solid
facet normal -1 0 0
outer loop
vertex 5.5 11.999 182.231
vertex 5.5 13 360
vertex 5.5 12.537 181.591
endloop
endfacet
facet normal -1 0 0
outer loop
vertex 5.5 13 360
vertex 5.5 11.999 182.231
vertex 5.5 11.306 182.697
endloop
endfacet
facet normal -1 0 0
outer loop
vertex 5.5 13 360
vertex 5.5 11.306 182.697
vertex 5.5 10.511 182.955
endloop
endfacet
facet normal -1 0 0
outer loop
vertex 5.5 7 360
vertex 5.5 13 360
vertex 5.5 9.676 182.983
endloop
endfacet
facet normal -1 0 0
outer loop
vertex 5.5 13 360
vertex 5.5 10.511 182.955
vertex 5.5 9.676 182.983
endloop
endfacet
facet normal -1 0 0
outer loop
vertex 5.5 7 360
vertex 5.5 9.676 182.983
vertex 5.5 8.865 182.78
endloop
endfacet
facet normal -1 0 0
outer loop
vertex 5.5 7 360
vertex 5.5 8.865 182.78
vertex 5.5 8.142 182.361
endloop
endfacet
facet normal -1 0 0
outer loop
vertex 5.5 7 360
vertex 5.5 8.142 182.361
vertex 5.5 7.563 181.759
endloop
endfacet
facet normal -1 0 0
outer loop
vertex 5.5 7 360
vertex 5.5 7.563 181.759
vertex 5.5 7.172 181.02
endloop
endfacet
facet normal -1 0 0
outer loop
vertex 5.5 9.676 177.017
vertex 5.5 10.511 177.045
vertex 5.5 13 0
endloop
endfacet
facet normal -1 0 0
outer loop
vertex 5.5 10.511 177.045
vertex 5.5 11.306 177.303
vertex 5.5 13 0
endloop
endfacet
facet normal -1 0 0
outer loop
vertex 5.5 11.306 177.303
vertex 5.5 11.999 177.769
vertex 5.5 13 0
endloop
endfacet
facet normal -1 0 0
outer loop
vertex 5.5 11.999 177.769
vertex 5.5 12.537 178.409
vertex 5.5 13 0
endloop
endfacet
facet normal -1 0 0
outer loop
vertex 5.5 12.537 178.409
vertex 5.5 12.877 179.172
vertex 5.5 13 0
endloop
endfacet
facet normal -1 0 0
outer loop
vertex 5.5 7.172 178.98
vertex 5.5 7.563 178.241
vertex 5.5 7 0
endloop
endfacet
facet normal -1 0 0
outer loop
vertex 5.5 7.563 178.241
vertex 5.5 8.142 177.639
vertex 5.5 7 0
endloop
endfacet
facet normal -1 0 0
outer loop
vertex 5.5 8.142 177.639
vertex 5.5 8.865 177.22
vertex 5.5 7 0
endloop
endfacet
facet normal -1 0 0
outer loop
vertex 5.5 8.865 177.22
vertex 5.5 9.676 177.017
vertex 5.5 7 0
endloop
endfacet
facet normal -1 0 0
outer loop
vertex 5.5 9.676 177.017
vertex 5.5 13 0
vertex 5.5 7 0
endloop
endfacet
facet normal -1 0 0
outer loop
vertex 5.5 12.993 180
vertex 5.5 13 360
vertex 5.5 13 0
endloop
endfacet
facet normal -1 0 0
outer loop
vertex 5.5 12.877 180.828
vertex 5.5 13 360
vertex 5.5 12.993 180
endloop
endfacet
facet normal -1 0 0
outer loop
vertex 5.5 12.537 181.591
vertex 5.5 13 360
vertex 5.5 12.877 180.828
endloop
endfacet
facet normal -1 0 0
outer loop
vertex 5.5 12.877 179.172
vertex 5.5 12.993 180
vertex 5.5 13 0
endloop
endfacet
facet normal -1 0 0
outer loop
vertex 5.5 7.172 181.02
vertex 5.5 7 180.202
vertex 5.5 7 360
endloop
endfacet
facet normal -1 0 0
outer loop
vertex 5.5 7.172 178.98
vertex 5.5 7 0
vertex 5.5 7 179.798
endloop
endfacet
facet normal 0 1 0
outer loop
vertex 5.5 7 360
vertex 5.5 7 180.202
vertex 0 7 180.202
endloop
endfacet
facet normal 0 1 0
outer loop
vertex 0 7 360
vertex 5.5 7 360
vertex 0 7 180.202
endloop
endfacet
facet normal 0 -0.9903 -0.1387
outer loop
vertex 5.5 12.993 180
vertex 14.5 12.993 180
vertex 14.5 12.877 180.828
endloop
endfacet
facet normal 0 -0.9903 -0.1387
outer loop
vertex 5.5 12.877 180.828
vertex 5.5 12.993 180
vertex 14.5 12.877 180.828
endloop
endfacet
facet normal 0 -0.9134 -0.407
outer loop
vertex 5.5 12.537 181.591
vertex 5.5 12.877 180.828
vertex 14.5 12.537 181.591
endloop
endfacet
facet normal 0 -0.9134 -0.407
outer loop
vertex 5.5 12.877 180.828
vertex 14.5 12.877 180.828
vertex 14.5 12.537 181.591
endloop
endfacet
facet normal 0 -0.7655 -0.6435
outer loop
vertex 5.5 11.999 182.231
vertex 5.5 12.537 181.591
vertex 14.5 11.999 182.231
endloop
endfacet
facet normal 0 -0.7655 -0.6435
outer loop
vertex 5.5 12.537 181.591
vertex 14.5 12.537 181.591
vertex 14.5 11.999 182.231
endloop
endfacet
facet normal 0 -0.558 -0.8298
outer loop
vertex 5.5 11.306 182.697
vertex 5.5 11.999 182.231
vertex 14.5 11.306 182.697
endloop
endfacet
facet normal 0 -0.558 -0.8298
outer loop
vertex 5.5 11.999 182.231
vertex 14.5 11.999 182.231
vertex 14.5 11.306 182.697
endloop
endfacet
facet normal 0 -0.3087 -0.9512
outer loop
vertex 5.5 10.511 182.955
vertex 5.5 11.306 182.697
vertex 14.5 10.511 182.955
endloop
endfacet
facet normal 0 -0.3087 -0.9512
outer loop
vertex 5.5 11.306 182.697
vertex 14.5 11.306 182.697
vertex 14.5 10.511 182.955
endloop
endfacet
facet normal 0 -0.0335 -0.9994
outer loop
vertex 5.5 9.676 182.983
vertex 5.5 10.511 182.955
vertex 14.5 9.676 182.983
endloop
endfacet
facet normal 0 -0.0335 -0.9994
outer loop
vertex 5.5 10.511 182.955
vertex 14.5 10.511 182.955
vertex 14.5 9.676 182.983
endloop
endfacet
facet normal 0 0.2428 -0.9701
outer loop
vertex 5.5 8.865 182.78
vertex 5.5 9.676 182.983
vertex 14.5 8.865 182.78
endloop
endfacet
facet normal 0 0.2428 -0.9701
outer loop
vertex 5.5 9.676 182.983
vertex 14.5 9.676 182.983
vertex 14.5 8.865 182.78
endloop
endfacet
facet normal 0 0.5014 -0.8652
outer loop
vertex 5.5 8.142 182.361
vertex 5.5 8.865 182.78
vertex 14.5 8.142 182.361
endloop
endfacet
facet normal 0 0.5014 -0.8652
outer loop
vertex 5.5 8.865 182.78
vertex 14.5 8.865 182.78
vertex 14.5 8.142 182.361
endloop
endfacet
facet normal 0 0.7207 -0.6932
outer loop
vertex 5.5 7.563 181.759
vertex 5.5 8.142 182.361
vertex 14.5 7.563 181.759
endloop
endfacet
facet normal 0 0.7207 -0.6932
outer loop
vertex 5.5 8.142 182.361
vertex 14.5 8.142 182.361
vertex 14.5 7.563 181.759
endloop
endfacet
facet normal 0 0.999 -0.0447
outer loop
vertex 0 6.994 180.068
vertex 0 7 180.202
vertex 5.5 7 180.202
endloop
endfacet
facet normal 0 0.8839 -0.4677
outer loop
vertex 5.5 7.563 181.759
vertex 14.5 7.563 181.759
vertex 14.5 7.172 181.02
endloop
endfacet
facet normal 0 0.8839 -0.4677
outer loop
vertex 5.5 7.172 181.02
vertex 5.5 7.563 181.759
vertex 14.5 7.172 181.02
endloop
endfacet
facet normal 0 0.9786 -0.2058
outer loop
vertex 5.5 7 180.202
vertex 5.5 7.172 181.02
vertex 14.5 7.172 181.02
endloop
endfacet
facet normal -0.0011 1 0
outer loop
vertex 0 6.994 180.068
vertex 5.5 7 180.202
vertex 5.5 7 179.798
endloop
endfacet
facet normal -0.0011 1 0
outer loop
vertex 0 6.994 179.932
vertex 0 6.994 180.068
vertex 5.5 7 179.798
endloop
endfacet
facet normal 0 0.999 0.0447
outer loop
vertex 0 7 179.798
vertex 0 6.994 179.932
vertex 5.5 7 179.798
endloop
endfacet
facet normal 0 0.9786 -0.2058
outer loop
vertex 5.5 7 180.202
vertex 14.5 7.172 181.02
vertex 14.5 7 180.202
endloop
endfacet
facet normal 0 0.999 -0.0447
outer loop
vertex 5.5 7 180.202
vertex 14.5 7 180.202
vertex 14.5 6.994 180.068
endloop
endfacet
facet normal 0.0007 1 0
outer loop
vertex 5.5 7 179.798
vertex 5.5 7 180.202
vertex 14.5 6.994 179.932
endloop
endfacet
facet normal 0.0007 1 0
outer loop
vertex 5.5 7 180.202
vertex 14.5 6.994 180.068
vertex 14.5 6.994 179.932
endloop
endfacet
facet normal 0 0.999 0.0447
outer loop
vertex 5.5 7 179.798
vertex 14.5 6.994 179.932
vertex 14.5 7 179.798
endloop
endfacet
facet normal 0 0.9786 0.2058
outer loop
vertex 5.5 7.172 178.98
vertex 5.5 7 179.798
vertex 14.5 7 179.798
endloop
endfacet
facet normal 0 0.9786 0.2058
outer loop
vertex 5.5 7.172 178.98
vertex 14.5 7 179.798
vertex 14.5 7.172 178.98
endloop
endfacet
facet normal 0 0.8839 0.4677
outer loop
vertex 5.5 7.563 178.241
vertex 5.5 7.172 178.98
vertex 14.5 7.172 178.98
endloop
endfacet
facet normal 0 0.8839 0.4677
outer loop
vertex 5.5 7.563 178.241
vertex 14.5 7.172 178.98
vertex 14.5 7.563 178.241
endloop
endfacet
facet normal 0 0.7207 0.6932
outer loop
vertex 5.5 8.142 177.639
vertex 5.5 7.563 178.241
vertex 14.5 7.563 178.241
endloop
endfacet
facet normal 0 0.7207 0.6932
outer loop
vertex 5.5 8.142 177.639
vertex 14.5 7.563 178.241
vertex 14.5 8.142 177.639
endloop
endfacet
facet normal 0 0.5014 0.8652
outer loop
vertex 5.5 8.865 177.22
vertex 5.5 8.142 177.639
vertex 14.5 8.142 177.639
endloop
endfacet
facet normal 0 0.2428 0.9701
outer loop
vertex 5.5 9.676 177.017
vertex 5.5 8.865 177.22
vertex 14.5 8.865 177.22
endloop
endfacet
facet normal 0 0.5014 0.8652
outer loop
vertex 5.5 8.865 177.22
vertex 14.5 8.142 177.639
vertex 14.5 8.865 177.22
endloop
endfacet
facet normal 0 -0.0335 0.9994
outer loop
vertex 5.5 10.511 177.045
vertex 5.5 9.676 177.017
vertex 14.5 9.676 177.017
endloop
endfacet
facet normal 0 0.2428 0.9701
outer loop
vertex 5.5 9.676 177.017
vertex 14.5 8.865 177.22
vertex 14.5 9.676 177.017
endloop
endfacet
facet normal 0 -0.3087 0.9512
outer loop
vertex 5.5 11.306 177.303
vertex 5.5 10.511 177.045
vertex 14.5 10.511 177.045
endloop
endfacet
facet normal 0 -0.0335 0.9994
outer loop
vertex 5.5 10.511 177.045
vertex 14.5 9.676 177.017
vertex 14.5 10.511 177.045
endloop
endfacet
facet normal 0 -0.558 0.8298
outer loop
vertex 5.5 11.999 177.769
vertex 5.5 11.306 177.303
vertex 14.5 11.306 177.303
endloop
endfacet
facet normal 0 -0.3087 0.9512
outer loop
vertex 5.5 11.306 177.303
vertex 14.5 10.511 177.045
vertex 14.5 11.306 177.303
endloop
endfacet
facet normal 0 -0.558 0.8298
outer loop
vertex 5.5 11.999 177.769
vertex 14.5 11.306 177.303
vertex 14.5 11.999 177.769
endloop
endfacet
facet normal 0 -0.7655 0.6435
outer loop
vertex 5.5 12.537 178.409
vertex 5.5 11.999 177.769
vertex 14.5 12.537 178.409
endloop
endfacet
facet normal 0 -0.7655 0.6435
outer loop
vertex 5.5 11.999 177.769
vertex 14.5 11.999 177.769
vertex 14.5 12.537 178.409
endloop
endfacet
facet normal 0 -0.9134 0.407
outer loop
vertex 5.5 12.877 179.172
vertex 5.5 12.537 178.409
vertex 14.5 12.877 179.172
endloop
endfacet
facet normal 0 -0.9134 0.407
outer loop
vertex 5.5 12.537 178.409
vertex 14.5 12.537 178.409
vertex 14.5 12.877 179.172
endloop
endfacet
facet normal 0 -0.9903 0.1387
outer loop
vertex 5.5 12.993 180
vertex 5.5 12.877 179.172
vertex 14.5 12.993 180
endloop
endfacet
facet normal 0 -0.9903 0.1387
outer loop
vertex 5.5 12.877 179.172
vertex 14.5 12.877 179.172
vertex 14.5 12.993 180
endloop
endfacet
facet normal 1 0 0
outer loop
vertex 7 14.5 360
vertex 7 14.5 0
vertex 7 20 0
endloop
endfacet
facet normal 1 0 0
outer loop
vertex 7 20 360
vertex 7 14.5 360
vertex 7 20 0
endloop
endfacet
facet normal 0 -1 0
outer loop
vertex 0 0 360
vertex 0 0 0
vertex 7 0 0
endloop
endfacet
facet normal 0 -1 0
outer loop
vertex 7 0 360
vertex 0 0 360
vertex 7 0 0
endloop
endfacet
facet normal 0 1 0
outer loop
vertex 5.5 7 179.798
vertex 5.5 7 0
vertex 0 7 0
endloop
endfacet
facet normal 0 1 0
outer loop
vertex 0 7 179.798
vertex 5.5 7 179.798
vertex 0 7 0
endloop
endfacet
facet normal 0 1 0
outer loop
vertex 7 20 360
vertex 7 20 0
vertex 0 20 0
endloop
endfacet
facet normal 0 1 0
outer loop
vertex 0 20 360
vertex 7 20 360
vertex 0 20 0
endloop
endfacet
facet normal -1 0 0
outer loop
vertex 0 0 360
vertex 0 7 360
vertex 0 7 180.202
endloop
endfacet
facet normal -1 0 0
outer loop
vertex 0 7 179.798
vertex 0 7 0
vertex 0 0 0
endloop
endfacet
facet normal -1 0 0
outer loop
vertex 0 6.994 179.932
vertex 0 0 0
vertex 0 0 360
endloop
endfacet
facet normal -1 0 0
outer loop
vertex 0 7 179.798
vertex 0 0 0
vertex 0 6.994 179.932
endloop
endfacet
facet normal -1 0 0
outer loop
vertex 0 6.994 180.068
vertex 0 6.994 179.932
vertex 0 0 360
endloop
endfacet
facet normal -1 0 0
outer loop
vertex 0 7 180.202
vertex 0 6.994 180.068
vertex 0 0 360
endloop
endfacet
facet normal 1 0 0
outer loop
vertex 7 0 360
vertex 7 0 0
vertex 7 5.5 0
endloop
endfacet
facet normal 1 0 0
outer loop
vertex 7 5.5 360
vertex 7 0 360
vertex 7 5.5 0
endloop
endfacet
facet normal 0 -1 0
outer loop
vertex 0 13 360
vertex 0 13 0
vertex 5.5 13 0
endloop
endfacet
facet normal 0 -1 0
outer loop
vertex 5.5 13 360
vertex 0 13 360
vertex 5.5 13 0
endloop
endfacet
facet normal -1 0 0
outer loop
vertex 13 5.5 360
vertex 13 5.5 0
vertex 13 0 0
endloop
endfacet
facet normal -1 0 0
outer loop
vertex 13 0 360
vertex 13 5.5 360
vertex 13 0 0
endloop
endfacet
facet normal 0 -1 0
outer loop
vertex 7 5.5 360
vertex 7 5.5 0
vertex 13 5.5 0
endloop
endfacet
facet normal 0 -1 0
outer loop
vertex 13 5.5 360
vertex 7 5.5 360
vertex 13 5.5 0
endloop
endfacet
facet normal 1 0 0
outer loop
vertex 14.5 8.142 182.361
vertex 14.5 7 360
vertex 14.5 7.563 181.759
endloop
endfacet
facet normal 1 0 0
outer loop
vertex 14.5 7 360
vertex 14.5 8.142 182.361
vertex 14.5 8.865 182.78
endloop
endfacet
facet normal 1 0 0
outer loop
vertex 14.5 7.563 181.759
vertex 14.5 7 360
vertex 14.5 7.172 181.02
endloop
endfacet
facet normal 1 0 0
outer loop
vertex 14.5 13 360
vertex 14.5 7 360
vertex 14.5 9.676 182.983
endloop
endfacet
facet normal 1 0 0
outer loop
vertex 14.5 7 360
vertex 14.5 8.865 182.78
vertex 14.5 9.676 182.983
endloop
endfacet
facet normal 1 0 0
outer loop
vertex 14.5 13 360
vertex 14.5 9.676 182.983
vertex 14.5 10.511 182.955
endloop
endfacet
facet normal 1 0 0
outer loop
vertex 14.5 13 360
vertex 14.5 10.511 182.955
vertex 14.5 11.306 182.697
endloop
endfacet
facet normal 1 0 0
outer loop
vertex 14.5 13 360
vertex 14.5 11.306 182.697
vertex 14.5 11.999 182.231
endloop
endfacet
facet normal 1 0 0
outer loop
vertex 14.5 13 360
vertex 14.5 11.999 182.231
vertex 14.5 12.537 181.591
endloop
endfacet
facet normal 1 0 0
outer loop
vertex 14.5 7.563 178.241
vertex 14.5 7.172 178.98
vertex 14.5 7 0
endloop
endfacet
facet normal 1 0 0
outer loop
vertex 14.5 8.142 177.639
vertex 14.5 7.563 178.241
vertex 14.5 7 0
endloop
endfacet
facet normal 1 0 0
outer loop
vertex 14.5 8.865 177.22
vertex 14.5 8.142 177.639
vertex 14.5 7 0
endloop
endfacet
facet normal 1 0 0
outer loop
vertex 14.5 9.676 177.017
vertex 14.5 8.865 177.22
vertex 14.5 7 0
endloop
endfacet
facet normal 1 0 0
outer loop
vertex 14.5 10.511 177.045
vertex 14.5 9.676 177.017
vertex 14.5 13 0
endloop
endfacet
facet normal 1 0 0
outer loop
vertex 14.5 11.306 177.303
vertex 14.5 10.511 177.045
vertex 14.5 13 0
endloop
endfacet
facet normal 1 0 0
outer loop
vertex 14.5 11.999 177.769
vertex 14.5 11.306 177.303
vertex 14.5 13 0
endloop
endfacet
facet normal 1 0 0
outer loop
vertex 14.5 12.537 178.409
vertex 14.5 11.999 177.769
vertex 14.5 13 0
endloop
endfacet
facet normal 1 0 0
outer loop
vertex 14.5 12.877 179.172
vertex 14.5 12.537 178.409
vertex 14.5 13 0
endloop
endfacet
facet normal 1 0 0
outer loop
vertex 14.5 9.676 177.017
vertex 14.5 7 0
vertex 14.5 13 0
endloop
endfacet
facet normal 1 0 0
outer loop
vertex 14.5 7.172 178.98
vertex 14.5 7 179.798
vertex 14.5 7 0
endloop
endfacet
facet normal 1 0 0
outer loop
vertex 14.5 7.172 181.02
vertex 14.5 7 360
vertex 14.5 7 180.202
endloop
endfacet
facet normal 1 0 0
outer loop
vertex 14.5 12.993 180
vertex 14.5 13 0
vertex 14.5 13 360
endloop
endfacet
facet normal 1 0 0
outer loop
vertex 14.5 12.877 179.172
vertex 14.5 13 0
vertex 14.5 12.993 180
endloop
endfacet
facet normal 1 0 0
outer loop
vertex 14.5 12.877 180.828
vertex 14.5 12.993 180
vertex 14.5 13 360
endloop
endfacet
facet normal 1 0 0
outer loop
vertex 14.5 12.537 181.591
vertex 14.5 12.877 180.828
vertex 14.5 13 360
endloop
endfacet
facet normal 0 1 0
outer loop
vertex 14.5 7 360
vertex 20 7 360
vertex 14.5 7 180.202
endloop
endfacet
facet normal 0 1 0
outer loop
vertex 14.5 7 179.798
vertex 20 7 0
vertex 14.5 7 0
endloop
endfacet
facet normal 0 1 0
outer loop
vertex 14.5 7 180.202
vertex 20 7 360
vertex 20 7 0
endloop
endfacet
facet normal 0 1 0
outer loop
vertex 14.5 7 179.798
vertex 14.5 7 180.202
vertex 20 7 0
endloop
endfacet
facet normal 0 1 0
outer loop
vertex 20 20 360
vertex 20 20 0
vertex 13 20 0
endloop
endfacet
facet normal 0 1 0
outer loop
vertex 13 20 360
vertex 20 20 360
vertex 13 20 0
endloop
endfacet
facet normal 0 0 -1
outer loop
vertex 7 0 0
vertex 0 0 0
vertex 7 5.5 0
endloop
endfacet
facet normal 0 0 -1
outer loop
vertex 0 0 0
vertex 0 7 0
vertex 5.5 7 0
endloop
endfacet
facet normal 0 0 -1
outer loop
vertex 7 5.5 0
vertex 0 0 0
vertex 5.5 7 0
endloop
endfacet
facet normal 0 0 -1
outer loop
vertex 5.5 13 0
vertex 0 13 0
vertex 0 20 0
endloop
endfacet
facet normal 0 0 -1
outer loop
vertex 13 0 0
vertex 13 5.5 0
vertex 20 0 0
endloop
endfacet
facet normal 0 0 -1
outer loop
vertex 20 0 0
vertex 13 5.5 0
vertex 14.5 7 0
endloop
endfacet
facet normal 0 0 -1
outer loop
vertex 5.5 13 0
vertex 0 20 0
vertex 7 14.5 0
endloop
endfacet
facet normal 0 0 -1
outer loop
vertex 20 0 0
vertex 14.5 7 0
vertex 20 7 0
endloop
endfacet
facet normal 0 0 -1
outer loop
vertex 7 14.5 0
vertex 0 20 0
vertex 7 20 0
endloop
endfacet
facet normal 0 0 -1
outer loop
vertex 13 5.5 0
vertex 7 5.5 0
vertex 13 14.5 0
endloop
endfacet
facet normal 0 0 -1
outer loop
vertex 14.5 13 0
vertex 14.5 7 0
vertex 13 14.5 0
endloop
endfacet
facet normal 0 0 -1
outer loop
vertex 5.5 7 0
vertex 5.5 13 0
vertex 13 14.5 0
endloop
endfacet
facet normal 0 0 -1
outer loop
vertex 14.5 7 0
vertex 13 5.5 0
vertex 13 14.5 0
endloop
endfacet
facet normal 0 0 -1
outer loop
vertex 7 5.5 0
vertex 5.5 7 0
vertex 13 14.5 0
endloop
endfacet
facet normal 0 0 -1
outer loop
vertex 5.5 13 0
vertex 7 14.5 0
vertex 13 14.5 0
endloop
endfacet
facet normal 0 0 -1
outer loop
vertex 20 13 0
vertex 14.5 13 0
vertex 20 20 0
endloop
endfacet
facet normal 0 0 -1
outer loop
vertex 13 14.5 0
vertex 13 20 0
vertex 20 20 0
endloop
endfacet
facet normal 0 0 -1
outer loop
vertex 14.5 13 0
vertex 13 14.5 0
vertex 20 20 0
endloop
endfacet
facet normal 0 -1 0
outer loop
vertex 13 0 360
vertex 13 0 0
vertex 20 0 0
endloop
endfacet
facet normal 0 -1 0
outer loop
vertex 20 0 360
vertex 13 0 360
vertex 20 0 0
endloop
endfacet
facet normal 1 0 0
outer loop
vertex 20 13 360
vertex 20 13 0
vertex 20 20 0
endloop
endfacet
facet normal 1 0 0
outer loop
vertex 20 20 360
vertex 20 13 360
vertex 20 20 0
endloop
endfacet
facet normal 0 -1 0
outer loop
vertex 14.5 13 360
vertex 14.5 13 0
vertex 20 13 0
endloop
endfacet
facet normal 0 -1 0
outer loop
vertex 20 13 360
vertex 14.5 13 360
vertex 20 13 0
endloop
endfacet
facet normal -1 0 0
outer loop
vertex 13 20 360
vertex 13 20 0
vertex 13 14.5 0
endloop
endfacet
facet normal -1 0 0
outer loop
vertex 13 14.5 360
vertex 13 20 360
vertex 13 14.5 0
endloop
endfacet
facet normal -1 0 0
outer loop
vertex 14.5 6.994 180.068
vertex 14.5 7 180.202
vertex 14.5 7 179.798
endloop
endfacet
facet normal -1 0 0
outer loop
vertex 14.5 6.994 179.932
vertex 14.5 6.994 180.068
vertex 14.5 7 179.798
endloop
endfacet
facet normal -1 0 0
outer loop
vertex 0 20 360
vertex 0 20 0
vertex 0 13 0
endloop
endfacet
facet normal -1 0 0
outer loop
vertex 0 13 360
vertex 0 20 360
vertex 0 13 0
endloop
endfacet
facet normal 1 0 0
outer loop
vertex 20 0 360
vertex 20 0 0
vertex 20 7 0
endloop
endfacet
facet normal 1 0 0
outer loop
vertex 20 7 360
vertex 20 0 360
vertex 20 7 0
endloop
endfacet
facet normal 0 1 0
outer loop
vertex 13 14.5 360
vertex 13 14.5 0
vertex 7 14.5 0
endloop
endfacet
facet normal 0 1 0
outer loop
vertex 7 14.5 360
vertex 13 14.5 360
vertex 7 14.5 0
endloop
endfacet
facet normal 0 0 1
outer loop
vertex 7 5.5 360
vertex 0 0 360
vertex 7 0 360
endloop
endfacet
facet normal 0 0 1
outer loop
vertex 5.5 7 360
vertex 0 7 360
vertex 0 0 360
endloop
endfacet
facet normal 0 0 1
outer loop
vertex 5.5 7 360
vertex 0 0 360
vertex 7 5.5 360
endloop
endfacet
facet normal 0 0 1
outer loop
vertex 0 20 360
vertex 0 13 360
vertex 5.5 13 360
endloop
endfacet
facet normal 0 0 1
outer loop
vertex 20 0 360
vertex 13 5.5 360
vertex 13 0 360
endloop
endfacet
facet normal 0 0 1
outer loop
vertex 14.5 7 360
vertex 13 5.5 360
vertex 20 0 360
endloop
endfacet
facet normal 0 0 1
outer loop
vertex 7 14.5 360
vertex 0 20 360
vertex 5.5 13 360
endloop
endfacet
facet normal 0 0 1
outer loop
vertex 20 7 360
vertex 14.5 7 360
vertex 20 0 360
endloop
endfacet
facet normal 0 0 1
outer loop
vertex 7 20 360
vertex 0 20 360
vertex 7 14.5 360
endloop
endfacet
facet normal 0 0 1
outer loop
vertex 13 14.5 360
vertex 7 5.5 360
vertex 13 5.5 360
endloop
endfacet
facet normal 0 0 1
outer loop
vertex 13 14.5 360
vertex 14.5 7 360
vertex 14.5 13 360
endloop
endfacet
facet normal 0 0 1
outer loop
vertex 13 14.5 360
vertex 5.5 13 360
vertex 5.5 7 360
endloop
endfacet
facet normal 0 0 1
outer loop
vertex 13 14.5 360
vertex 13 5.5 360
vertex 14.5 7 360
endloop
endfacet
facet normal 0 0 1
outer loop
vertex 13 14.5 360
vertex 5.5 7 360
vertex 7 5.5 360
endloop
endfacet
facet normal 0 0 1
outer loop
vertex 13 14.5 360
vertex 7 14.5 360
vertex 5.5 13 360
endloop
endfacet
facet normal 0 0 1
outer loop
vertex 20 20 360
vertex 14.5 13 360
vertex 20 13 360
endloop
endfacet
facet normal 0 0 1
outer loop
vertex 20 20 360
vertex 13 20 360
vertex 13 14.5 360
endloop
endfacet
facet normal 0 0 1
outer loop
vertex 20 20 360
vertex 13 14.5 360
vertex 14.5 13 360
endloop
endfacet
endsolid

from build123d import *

# Parameters (mm, degrees)
F1_DEPTH = 360
F2_R     = 3
F3_DEPTH = 25


with BuildPart() as f1:
    # F0 (on Top) → F1 (new body)
    with BuildSketch(Plane.XY):
        Polygon((0, 7), (0, 0), (7, 0), (7, 5.5), (13, 5.5), (13, 0), (20, 0), (20, 7), (14.5, 7), (14.5, 13), (20, 13), (20, 20), (13, 20), (13, 14.5), (7, 14.5), (7, 20), (0, 20), (0, 13), (5.5, 13), (5.5, 7), align=None)
    extrude(amount=F1_DEPTH)

    # F2 (on face) → F3 (cut)
    with BuildSketch(Plane.YZ.offset(14.5)):
        with Locations((9.993159, 180)):
            Circle(F2_R)
    extrude(amount=-F3_DEPTH, mode=Mode.SUBTRACT)


solid = f1.part
